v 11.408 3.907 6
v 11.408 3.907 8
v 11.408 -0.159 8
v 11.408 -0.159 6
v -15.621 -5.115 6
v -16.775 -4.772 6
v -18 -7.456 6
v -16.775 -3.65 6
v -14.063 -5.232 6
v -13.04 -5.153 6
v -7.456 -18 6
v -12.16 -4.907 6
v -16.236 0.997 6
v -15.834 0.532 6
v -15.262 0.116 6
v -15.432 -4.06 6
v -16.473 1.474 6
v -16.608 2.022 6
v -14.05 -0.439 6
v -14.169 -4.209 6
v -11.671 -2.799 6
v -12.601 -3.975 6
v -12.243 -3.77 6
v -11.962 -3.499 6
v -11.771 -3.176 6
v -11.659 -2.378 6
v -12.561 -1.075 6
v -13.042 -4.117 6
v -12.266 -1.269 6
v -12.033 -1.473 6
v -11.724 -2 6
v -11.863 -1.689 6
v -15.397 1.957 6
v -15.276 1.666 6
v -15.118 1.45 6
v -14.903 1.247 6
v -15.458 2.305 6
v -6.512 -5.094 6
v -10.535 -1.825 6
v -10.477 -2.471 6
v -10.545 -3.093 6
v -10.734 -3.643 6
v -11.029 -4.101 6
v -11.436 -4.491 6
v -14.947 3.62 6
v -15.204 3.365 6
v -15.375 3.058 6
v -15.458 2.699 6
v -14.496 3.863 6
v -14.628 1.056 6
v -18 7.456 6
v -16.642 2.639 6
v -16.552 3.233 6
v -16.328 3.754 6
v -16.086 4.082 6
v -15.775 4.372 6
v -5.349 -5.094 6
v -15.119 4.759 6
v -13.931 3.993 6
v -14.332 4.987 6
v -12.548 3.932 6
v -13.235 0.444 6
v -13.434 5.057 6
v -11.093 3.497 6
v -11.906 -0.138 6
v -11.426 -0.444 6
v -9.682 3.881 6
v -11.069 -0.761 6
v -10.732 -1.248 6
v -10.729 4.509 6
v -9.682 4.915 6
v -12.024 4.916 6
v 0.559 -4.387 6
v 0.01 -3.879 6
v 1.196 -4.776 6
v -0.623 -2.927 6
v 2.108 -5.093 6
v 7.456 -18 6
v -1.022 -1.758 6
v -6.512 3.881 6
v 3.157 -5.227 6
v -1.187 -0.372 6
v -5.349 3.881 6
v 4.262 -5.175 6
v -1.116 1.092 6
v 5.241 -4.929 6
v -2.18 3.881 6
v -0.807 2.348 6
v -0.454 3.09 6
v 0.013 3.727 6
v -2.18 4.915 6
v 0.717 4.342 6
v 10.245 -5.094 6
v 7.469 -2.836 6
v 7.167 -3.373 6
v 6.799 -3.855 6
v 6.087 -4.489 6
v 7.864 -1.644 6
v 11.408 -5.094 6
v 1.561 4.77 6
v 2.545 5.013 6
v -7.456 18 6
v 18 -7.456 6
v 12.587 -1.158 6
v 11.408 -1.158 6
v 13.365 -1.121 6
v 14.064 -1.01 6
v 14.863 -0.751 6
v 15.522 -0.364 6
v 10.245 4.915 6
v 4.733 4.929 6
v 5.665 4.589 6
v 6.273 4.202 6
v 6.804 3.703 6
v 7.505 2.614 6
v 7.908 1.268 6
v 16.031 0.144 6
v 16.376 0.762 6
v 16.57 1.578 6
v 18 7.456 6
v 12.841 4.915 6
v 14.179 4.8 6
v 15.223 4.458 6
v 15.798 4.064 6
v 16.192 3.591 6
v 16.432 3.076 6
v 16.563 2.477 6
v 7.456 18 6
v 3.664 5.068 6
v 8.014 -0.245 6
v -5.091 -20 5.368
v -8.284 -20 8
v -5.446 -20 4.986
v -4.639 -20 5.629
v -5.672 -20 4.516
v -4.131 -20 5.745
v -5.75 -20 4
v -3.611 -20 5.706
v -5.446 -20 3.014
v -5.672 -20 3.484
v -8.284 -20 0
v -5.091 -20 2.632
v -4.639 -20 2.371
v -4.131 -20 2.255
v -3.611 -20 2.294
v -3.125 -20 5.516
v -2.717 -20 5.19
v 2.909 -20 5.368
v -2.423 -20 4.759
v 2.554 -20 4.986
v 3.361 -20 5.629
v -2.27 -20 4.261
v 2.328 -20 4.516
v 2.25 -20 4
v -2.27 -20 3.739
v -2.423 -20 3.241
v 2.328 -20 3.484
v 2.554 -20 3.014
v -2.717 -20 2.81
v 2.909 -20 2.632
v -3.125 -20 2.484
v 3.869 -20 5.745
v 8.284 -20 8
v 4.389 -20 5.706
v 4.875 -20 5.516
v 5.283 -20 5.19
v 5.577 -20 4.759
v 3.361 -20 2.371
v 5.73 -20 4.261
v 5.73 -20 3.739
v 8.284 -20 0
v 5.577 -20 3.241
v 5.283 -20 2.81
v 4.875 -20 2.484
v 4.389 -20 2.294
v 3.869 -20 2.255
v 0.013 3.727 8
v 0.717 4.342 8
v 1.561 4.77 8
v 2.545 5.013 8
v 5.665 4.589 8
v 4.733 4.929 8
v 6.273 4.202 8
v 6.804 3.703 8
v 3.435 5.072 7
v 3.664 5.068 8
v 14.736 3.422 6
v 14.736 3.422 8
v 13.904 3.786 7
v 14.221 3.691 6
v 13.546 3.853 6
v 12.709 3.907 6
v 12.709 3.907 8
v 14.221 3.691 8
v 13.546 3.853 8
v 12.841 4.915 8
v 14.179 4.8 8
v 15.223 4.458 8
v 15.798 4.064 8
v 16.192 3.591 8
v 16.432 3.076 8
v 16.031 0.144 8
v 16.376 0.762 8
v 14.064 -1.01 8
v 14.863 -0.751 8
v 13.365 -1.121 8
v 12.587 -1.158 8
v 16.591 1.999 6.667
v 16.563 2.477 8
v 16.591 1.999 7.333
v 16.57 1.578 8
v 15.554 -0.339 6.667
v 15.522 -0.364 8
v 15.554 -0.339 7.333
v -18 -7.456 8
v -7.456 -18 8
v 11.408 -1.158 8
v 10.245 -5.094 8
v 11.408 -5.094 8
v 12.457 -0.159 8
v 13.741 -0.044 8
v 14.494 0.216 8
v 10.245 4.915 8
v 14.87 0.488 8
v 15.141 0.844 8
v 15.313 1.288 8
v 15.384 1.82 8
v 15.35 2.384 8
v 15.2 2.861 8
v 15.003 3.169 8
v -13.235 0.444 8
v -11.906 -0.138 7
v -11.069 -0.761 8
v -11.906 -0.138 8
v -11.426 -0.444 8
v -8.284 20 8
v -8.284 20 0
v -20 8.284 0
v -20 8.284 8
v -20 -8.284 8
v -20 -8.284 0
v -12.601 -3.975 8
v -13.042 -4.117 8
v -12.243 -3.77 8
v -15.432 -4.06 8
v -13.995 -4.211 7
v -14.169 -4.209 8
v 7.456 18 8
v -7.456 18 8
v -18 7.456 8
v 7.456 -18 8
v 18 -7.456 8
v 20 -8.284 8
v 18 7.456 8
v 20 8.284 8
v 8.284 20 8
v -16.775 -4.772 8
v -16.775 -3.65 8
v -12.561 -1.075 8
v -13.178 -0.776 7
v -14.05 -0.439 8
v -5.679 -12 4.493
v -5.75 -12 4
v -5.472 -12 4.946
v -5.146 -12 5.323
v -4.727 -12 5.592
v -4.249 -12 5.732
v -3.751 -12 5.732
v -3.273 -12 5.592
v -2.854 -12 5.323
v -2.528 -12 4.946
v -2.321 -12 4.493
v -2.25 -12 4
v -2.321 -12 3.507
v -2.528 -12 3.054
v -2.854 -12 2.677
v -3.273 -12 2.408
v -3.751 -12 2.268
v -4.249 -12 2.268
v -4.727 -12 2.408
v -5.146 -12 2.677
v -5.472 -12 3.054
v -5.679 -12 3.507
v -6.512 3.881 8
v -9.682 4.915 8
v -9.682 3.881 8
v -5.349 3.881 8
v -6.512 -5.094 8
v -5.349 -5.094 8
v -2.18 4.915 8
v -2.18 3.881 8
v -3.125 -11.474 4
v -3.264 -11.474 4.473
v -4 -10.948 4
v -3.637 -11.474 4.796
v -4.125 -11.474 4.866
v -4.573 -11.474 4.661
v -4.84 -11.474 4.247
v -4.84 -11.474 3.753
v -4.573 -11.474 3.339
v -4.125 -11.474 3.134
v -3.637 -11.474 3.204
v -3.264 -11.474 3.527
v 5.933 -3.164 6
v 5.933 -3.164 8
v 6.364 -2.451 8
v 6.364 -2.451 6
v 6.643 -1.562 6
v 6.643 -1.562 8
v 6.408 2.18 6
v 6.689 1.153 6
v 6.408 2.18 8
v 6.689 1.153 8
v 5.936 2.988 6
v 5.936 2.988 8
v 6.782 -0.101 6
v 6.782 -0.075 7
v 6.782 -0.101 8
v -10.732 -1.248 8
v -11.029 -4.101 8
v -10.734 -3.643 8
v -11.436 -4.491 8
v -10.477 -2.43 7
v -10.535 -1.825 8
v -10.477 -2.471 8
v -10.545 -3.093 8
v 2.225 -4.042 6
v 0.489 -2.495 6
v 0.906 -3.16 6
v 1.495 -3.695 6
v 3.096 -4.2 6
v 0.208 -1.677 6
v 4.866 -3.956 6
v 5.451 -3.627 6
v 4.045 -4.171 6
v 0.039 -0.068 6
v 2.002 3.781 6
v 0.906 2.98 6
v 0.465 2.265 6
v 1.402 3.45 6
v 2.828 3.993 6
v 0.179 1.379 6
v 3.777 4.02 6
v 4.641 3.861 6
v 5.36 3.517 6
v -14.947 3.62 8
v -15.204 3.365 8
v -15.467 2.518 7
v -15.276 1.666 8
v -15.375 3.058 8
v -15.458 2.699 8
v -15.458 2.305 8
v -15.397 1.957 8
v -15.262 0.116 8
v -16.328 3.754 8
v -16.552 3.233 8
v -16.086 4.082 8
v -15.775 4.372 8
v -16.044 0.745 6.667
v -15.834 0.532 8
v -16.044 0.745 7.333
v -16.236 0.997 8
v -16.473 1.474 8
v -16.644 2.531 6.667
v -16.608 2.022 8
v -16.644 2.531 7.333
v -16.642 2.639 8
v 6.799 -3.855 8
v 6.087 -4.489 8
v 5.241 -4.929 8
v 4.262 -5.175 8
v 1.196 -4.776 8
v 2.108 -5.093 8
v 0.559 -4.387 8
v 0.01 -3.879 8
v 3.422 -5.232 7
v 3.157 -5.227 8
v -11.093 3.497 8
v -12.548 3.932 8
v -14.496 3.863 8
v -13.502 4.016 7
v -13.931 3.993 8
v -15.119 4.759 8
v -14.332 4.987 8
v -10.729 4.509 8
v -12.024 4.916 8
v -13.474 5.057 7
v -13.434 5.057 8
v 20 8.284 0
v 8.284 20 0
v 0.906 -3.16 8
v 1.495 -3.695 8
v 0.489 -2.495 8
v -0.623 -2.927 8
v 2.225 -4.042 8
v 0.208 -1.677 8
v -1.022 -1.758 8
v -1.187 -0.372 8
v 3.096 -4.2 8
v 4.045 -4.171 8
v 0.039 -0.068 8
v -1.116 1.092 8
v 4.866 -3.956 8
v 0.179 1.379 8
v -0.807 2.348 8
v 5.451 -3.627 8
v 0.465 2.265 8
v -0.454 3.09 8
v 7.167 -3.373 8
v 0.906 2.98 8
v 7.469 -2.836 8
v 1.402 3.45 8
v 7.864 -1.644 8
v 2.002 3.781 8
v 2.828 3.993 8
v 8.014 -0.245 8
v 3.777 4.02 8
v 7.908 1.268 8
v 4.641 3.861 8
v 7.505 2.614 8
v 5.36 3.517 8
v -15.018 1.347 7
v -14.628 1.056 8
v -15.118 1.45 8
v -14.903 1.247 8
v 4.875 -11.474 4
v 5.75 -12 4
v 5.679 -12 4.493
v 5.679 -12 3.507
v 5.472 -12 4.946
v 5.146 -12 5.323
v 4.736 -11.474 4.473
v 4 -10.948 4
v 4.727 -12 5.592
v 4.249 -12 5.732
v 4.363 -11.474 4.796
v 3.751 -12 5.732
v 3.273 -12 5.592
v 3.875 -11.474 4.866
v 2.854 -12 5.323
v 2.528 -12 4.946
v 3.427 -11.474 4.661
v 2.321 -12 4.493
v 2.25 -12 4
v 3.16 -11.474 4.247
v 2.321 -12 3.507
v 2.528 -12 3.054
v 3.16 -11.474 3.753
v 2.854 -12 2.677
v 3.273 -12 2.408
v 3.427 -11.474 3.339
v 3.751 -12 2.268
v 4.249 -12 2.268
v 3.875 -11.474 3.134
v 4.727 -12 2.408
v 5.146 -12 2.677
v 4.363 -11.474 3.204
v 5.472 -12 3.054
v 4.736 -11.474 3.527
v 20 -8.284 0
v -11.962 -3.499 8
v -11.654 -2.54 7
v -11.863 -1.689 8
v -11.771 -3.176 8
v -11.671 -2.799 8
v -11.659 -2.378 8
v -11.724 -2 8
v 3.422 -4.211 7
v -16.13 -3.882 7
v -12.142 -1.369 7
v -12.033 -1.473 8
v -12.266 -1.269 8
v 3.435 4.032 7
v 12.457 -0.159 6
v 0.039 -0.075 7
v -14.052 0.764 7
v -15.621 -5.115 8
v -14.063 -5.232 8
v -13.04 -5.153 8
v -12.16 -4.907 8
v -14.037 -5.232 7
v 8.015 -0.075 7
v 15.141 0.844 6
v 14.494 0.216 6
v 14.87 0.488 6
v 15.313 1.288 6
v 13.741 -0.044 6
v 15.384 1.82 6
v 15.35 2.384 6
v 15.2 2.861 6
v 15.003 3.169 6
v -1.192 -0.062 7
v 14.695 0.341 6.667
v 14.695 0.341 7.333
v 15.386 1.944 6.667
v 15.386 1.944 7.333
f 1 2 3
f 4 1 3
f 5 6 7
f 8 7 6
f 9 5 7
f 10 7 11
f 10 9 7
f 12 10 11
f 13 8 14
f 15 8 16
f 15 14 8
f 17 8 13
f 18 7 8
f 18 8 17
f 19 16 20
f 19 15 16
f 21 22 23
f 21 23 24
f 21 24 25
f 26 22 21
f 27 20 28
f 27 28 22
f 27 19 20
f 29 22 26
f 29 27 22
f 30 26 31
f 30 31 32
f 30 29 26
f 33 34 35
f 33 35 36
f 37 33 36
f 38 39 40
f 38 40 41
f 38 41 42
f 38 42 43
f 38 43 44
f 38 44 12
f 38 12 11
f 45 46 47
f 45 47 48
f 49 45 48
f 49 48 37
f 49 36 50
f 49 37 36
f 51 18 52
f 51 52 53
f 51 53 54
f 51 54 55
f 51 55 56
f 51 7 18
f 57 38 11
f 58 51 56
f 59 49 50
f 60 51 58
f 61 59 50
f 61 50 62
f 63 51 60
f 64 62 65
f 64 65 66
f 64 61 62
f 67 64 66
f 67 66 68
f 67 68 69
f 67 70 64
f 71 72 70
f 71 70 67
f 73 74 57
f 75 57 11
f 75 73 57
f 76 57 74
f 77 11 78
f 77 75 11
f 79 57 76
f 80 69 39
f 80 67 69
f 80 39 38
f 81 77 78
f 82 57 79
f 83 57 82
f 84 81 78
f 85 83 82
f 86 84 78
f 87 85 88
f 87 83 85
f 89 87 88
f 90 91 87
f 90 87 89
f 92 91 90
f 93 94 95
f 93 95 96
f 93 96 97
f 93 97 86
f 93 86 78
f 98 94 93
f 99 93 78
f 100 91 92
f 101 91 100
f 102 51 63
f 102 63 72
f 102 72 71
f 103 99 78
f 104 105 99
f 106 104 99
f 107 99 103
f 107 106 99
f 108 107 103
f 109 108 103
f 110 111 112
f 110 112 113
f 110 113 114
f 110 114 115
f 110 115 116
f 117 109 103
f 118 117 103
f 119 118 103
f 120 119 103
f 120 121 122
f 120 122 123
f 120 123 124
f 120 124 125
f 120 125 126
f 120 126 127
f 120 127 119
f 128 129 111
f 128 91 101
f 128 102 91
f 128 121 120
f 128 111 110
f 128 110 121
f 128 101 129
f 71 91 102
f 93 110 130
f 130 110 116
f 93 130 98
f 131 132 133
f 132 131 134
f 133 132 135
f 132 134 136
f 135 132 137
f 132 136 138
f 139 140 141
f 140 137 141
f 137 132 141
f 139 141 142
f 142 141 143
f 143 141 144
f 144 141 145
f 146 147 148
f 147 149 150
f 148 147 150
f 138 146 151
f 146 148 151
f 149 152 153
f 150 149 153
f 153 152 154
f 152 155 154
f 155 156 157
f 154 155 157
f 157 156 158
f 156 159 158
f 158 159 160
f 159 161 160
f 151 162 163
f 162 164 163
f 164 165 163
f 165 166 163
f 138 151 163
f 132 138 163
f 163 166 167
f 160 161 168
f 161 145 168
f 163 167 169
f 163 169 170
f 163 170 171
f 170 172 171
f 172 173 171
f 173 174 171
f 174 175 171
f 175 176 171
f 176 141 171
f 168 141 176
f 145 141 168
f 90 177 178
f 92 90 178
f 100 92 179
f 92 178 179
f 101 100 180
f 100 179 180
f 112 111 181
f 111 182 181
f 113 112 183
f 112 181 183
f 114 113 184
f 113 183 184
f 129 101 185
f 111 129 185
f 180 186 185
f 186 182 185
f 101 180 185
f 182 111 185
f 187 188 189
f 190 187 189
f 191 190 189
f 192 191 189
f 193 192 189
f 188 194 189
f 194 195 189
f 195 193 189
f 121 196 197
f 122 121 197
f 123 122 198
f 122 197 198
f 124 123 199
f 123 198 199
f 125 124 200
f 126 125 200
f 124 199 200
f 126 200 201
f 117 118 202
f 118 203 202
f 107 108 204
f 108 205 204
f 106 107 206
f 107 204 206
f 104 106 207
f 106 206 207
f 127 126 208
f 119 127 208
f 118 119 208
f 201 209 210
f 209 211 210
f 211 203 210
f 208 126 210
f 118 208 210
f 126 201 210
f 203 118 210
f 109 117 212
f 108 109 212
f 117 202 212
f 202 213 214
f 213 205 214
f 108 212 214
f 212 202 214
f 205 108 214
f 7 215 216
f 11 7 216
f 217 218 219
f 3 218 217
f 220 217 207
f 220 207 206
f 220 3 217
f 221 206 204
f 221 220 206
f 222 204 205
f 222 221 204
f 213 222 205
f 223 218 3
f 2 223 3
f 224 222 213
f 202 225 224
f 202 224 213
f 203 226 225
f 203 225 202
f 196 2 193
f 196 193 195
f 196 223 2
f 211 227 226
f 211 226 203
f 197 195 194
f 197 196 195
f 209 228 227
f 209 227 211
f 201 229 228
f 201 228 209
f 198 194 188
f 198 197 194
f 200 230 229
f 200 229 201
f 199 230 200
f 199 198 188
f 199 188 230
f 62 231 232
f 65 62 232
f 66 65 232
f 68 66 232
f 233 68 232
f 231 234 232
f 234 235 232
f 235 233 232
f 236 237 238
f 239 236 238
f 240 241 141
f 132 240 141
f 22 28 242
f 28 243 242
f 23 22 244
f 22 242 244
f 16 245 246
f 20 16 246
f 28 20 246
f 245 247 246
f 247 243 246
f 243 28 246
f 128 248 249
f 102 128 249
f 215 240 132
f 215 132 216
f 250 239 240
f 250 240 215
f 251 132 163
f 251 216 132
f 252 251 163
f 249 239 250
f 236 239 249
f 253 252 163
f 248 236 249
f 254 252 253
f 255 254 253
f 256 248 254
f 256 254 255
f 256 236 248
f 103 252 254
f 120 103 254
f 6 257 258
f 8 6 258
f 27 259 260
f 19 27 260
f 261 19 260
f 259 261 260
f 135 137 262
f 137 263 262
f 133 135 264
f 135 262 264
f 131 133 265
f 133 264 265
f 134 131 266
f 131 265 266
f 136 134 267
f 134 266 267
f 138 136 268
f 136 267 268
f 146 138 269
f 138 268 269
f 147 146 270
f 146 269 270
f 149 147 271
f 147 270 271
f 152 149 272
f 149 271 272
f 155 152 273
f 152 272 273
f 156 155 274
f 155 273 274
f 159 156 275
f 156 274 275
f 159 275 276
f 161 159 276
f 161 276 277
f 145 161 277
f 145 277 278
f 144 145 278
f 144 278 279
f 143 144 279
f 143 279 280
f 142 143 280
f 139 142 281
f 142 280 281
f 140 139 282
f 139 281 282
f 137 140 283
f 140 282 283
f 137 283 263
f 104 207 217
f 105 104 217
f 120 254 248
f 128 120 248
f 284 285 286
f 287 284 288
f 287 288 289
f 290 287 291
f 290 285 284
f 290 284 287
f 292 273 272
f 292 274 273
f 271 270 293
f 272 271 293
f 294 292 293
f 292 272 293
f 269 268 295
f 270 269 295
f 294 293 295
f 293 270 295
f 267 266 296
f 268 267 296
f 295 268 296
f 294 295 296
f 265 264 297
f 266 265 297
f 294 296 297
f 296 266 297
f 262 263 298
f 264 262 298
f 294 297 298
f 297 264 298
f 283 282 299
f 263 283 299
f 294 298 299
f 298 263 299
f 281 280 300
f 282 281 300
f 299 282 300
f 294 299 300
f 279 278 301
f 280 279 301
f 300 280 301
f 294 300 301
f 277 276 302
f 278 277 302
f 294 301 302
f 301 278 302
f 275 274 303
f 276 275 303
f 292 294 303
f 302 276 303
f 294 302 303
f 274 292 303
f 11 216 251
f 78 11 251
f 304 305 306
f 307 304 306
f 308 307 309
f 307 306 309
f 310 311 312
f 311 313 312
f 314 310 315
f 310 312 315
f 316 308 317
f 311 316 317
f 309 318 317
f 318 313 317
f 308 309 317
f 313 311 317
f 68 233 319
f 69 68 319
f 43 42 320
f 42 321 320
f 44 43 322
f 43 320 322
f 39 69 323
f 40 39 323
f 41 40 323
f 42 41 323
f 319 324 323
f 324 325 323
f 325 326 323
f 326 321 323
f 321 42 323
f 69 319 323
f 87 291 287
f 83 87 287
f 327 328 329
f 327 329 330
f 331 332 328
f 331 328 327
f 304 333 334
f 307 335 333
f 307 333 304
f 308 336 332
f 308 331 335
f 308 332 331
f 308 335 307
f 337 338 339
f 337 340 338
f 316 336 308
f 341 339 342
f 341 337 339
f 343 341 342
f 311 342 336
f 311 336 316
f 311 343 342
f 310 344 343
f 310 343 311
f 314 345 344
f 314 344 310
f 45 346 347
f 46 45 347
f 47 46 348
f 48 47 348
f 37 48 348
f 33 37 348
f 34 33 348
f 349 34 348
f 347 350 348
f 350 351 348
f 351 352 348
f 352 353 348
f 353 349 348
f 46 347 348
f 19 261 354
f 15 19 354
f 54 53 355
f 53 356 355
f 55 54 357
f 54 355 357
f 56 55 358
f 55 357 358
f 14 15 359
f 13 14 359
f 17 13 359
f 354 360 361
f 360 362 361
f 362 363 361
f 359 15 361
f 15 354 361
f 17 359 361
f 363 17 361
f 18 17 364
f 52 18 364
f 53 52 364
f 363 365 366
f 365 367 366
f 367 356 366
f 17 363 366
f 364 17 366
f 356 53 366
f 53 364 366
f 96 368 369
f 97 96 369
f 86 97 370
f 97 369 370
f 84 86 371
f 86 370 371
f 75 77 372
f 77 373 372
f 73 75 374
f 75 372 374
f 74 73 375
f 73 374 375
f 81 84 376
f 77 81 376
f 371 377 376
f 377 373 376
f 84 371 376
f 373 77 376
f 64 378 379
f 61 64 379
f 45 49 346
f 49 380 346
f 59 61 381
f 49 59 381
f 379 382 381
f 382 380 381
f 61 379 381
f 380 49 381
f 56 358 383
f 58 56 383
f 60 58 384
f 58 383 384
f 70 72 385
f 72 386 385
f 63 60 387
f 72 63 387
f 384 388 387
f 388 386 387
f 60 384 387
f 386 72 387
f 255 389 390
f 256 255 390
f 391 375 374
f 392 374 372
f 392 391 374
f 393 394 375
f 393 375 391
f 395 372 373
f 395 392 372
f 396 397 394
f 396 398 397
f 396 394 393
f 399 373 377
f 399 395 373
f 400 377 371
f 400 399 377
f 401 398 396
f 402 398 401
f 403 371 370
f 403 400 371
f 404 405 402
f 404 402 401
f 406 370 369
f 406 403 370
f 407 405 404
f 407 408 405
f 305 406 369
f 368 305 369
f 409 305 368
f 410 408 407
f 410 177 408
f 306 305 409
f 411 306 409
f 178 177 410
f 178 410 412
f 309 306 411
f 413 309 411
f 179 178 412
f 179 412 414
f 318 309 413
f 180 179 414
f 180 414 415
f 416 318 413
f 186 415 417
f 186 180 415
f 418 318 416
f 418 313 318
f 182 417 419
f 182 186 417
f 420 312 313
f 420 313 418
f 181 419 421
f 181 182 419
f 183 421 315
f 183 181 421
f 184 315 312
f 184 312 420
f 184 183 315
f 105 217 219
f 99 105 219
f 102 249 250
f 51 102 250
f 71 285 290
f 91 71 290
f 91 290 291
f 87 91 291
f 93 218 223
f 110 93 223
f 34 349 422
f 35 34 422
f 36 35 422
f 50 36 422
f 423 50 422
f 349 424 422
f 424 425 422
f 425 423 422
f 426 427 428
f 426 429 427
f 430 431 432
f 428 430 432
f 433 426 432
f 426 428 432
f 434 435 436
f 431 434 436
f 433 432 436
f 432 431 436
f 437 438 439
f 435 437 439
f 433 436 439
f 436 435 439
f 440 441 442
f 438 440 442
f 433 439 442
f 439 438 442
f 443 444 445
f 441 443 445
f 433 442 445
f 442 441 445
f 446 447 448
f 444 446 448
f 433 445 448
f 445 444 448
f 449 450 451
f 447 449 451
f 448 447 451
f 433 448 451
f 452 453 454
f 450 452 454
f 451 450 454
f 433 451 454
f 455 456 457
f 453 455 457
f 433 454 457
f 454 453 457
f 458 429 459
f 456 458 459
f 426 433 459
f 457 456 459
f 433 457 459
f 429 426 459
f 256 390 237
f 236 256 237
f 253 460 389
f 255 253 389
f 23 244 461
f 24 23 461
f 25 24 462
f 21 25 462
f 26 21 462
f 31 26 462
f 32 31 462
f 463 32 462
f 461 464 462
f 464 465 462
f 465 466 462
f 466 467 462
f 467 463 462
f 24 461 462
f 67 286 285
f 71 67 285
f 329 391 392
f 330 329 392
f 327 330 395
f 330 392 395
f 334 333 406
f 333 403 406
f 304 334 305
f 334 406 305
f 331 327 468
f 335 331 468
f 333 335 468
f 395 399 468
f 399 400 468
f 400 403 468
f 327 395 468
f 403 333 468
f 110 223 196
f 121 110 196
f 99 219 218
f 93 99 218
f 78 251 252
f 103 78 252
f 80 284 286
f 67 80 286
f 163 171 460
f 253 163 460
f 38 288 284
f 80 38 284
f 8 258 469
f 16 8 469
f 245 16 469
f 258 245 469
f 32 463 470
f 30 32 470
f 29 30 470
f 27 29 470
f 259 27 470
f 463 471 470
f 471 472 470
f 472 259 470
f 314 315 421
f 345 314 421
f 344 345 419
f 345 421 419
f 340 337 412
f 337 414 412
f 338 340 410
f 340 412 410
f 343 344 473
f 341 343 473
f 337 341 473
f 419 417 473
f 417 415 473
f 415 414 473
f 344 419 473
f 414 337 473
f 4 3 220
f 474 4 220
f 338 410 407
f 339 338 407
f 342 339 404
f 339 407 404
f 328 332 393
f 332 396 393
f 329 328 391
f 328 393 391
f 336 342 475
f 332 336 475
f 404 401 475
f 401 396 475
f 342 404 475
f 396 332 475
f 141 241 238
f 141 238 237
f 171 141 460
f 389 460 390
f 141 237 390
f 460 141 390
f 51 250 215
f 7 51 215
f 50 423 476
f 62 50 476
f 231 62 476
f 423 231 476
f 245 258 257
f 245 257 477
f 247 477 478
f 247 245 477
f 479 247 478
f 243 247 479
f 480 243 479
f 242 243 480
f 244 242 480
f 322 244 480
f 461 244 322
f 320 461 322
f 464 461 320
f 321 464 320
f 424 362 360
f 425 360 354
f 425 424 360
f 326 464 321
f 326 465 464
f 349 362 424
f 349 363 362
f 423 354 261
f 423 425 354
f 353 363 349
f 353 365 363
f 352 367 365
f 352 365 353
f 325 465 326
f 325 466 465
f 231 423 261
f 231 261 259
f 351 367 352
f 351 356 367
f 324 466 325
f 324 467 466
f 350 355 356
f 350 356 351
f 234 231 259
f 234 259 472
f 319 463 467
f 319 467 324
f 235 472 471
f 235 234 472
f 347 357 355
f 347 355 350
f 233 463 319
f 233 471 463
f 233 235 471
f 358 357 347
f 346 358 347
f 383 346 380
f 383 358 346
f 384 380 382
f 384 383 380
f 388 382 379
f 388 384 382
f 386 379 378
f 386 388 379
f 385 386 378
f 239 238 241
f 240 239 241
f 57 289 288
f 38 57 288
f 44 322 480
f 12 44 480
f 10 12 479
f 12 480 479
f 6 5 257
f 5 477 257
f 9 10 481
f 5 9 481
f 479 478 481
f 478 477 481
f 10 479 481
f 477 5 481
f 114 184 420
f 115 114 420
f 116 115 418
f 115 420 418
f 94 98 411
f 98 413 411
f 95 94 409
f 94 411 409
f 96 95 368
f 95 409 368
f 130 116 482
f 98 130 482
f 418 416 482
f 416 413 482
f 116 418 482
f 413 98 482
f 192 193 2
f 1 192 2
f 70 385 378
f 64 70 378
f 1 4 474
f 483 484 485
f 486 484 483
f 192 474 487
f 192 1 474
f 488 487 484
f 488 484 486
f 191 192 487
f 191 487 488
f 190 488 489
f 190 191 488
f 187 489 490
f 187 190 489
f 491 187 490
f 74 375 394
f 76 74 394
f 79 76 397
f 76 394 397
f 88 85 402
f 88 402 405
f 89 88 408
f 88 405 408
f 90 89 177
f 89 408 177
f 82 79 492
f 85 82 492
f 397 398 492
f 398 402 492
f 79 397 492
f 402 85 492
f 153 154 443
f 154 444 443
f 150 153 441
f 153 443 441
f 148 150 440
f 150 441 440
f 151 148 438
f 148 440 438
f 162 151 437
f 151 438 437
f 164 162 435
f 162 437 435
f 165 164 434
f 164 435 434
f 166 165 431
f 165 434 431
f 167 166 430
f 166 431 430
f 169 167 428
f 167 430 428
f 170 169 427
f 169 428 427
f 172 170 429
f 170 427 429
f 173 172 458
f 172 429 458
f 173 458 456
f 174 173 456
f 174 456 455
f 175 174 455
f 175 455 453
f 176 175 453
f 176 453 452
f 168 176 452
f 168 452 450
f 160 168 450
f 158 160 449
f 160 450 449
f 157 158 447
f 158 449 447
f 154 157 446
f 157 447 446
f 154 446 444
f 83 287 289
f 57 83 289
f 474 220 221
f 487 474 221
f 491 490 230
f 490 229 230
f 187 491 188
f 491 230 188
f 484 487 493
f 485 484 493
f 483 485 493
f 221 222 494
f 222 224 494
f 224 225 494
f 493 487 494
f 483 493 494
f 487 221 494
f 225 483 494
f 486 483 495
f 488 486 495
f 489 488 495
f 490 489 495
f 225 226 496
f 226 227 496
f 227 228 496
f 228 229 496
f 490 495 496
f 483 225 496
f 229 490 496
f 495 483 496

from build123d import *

# Parameters (mm, degrees)
F1_DEPTH = 8
F3_DEPTH = 2
F5_D     = 3.5
F5_DEPTH = 8
F5_TIP   = 1.0515060833


with BuildPart() as f1:
    # F0 (on Top) → F1 (new body)
    with BuildSketch(Plane.XY):
        Polygon((20, -8.2842712475), (20, 8.2842712475), (8.2842712475, 20), (-8.2842712475, 20), (-20, 8.2842712475), (-20, -8.2842712475), (-8.2842712475, -20), (8.2842712475, -20), align=None)
    extrude(amount=F1_DEPTH)

    # F2 (on face) → F3 (cut)
    with BuildSketch(Plane.XY.offset(8)):
        Polygon((18, -7.4558441227), (18, 7.4558441227), (7.4558441227, 18), (-7.4558441227, 18), (-18, 7.4558441227), (-18, -7.4558441227), (-7.4558441227, -18), (7.4558441227, -18), align=None)
        with BuildLine():
            add(Edge.make_bspline(
                [(-11.0686569032, -0.7610464389), (-10.4772186757, -1.4050569533), (-10.4772186757, -2.4302165478)],
                knots=[0, 0, 0, 1, 1, 1], degree=2))
            add(Edge.make_bspline(
                [(-10.4772186757, -2.4302165478), (-10.4772186757, -3.751095256), (-11.4355676555, -4.4914882964)],
                knots=[0, 0, 0, 1, 1, 1], degree=2))
            add(Edge.make_bspline(
                [(-11.4355676555, -4.4914882964), (-12.3939166354, -5.2318813368), (-14.0368006008, -5.2318813368)],
                knots=[0, 0, 0, 1, 1, 1], degree=2))
            add(Edge.make_bspline(
                [(-14.0368006008, -5.2318813368), (-15.8154963074, -5.2318813368), (-16.7749405432, -4.7718738265)],
                knots=[0, 0, 0, 1, 1, 1], degree=2))
            Line((-16.7749405432, -4.7718738265), (-16.7749405432, -3.6503317061))
            add(Edge.make_bspline(
                [(-16.7749405432, -3.6503317061), (-16.1572161722, -3.9088121167), (-15.4321567155, -4.0599574415)],
                knots=[0, 0, 0, 1, 1, 1], degree=2))
            add(Edge.make_bspline(
                [(-15.4321567155, -4.0599574415), (-14.7070972587, -4.2111027663), (-13.9951808737, -4.2111027663)],
                knots=[0, 0, 0, 1, 1, 1], degree=2))
            add(Edge.make_bspline(
                [(-13.9951808737, -4.2111027663), (-12.8320190262, -4.2111027663), (-12.2427713106, -3.7697146076)],
                knots=[0, 0, 0, 1, 1, 1], degree=2))
            add(Edge.make_bspline(
                [(-12.2427713106, -3.7697146076), (-11.6535235949, -3.3283264489), (-11.6535235949, -2.5397421454)],
                knots=[0, 0, 0, 1, 1, 1], degree=2))
            add(Edge.make_bspline(
                [(-11.6535235949, -2.5397421454), (-11.6535235949, -2.0205908124), (-11.8627174865, -1.6887282513)],
                knots=[0, 0, 0, 1, 1, 1], degree=2))
            add(Edge.make_bspline(
                [(-11.8627174865, -1.6887282513), (-12.0719113781, -1.3568656903), (-12.5614907998, -1.0753849042)],
                knots=[0, 0, 0, 1, 1, 1], degree=2))
            add(Edge.make_bspline(
                [(-12.5614907998, -1.0753849042), (-13.0510702216, -0.7939041182), (-14.0499436725, -0.4390411816)],
                knots=[0, 0, 0, 1, 1, 1], degree=2))
            add(Edge.make_bspline(
                [(-14.0499436725, -0.4390411816), (-15.4452997872, 0.0603955439), (-16.0444048066, 0.7449305295)],
                knots=[0, 0, 0, 1, 1, 1], degree=2))
            add(Edge.make_bspline(
                [(-16.0444048066, 0.7449305295), (-16.643509826, 1.4294655151), (-16.643509826, 2.5312930279)],
                knots=[0, 0, 0, 1, 1, 1], degree=2))
            add(Edge.make_bspline(
                [(-16.643509826, 2.5312930279), (-16.643509826, 3.6878833396), (-15.7749718363, 4.3724183252)],
                knots=[0, 0, 0, 1, 1, 1], degree=2))
            add(Edge.make_bspline(
                [(-15.7749718363, 4.3724183252), (-14.9064338465, 5.0569533108), (-13.4738390287, 5.0569533108)],
                knots=[0, 0, 0, 1, 1, 1], degree=2))
            add(Edge.make_bspline(
                [(-13.4738390287, 5.0569533108), (-11.982100388, 5.0569533108), (-10.7291275504, 4.5093253223)],
                knots=[0, 0, 0, 1, 1, 1], degree=2))
            Line((-10.7291275504, 4.5093253223), (-11.0927525347, 3.4973087996))
            add(Edge.make_bspline(
                [(-11.0927525347, 3.4973087996), (-12.3325823007, 4.0164601327), (-13.5023156841, 4.0164601327)],
                knots=[0, 0, 0, 1, 1, 1], degree=2))
            add(Edge.make_bspline(
                [(-13.5023156841, 4.0164601327), (-14.4267117286, 4.0164601327), (-14.9469583177, 3.619977469)],
                knots=[0, 0, 0, 1, 1, 1], degree=2))
            add(Edge.make_bspline(
                [(-14.9469583177, 3.619977469), (-15.4672049067, 3.2234948054), (-15.4672049067, 2.5181499562)],
                knots=[0, 0, 0, 1, 1, 1], degree=2))
            add(Edge.make_bspline(
                [(-15.4672049067, 2.5181499562), (-15.4672049067, 1.9989986231), (-15.2755351108, 1.6660408061)],
                knots=[0, 0, 0, 1, 1, 1], degree=2))
            add(Edge.make_bspline(
                [(-15.2755351108, 1.6660408061), (-15.0838653148, 1.3330829891), (-14.6282388284, 1.0559832269)],
                knots=[0, 0, 0, 1, 1, 1], degree=2))
            add(Edge.make_bspline(
                [(-14.6282388284, 1.0559832269), (-14.172612342, 0.7788834648), (-13.2350732257, 0.4437351358)],
                knots=[0, 0, 0, 1, 1, 1], degree=2))
            add(Edge.make_bspline(
                [(-13.2350732257, 0.4437351358), (-11.6600951308, -0.1170359244), (-11.0686569032, -0.7610464389)],
                knots=[0, 0, 0, 1, 1, 1], degree=2))
        make_face(mode=Mode.SUBTRACT)
        Polygon((-5.3492301915, 3.8806483915), (-5.3492301915, -5.0938790837), (-6.5123920391, -5.0938790837), (-6.5123920391, 3.8806483915), (-9.6820628364, 3.8806483915), (-9.6820628364, 4.9145700338), (-2.1795593942, 4.9145700338), (-2.1795593942, 3.8806483915), align=None, mode=Mode.SUBTRACT)
        with BuildLine():
            add(Edge.make_bspline(
                [(6.8037301289, 3.7032169233), (8.0150832395, 2.3341469521), (8.0150832395, -0.0754161973)],
                knots=[0, 0, 0, 1, 1, 1], degree=2))
            add(Edge.make_bspline(
                [(8.0150832395, -0.0754161973), (8.0150832395, -2.4784078107), (6.799349105, -3.8551445738)],
                knots=[0, 0, 0, 1, 1, 1], degree=2))
            add(Edge.make_bspline(
                [(6.799349105, -3.8551445738), (5.5836149706, -5.2318813368), (3.421579672, -5.2318813368)],
                knots=[0, 0, 0, 1, 1, 1], degree=2))
            add(Edge.make_bspline(
                [(3.421579672, -5.2318813368), (1.2113531105, -5.2318813368), (0.0098573038, -3.8792402053)],
                knots=[0, 0, 0, 1, 1, 1], degree=2))
            add(Edge.make_bspline(
                [(0.0098573038, -3.8792402053), (-1.1916385029, -2.5265990737), (-1.1916385029, -0.0622731255)],
                knots=[0, 0, 0, 1, 1, 1], degree=2))
            add(Edge.make_bspline(
                [(-1.1916385029, -0.0622731255), (-1.1916385029, 2.382338215), (0.0131430717, 3.7273125548)],
                knots=[0, 0, 0, 1, 1, 1], degree=2))
            add(Edge.make_bspline(
                [(0.0131430717, 3.7273125548), (1.2179246464, 5.0722868945), (3.4347227438, 5.0722868945)],
                knots=[0, 0, 0, 1, 1, 1], degree=2))
            add(Edge.make_bspline(
                [(3.4347227438, 5.0722868945), (5.5923770184, 5.0722868945), (6.8037301289, 3.7032169233)],
                knots=[0, 0, 0, 1, 1, 1], degree=2))
        make_face(mode=Mode.SUBTRACT)
        with BuildLine():
            add(Edge.make_bspline(
                [(12.840781074, 4.9145700338), (16.5909375391, 4.9145700338), (16.5909375391, 1.9989986231)],
                knots=[0, 0, 0, 1, 1, 1], degree=2))
            add(Edge.make_bspline(
                [(16.5909375391, 1.9989986231), (16.5909375391, 0.4787833271), (15.5537301289, -0.3393728877)],
                knots=[0, 0, 0, 1, 1, 1], degree=2))
            add(Edge.make_bspline(
                [(15.5537301289, -0.3393728877), (14.5165227187, -1.1575291025), (12.5866816873, -1.1575291025)],
                knots=[0, 0, 0, 1, 1, 1], degree=2))
            Line((12.5866816873, -1.1575291025), (11.4081862561, -1.1575291025))
            Line((11.4081862561, -1.1575291025), (11.4081862561, -5.0938790837))
            Line((11.4081862561, -5.0938790837), (10.2450244086, -5.0938790837))
            Line((10.2450244086, -5.0938790837), (10.2450244086, 4.9145700338))
            Line((10.2450244086, 4.9145700338), (12.840781074, 4.9145700338))
        make_face(mode=Mode.SUBTRACT)
        with BuildLine():
            add(Edge.make_bspline(
                [(0.905776693, 2.9803479785), (0.0394292152, 1.9289022406), (0.0394292152, -0.0754161973)],
                knots=[0, 0, 0, 1, 1, 1], degree=2))
            add(Edge.make_bspline(
                [(0.0394292152, -0.0754161973), (0.0394292152, -2.1082112905), (0.905776693, -3.1596570284)],
                knots=[0, 0, 0, 1, 1, 1], degree=2))
            add(Edge.make_bspline(
                [(0.905776693, -3.1596570284), (1.7721241707, -4.2111027663), (3.421579672, -4.2111027663)],
                knots=[0, 0, 0, 1, 1, 1], degree=2))
            add(Edge.make_bspline(
                [(3.421579672, -4.2111027663), (5.0841782451, -4.2111027663), (5.9330016272, -3.1640380523)],
                knots=[0, 0, 0, 1, 1, 1], degree=2))
            add(Edge.make_bspline(
                [(5.9330016272, -3.1640380523), (6.7818250094, -2.1169733383), (6.7818250094, -0.0754161973)],
                knots=[0, 0, 0, 1, 1, 1], degree=2))
            add(Edge.make_bspline(
                [(6.7818250094, -0.0754161973), (6.7818250094, 1.9442358243), (5.9362873952, 2.9880147703)],
                knots=[0, 0, 0, 1, 1, 1], degree=2))
            add(Edge.make_bspline(
                [(5.9362873952, 2.9880147703), (5.0907497809, 4.0317937164), (3.4347227438, 4.0317937164)],
                knots=[0, 0, 0, 1, 1, 1], degree=2))
            add(Edge.make_bspline(
                [(3.4347227438, 4.0317937164), (1.7721241707, 4.0317937164), (0.905776693, 2.9803479785)],
                knots=[0, 0, 0, 1, 1, 1], degree=2))
        make_face()
        with BuildLine():
            Line((11.4081862561, 3.906934535), (11.4081862561, -0.1586556515))
            Line((11.4081862561, -0.1586556515), (12.457441482, -0.1586556515))
            add(Edge.make_bspline(
                [(12.457441482, -0.1586556515), (14.0039429215, -0.1586556515), (14.695049443, 0.340781074)],
                knots=[0, 0, 0, 1, 1, 1], degree=2))
            add(Edge.make_bspline(
                [(14.695049443, 0.340781074), (15.3861559645, 0.8402177995), (15.3861559645, 1.9442358243)],
                knots=[0, 0, 0, 1, 1, 1], degree=2))
            add(Edge.make_bspline(
                [(15.3861559645, 1.9442358243), (15.3861559645, 2.9365377394), (14.7355739141, 3.4217361372)],
                knots=[0, 0, 0, 1, 1, 1], degree=2))
            add(Edge.make_bspline(
                [(14.7355739141, 3.4217361372), (14.0849918638, 3.906934535), (12.7093503567, 3.906934535)],
                knots=[0, 0, 0, 1, 1, 1], degree=2))
            Line((12.7093503567, 3.906934535), (11.4081862561, 3.906934535))
        make_face()
    extrude(amount=-F3_DEPTH, mode=Mode.SUBTRACT)

    # F5
    with Locations(Plane.XZ.offset(20)):
        with Locations((-4, 4), (4, 4)):
            Hole(F5_D / 2, depth=F5_DEPTH)
            with Locations((0, 0, -(F5_DEPTH + F5_TIP / 2))):  # 118° drill point
                Cone(0, F5_D / 2, F5_TIP, mode=Mode.SUBTRACT)


solid = f1.part
